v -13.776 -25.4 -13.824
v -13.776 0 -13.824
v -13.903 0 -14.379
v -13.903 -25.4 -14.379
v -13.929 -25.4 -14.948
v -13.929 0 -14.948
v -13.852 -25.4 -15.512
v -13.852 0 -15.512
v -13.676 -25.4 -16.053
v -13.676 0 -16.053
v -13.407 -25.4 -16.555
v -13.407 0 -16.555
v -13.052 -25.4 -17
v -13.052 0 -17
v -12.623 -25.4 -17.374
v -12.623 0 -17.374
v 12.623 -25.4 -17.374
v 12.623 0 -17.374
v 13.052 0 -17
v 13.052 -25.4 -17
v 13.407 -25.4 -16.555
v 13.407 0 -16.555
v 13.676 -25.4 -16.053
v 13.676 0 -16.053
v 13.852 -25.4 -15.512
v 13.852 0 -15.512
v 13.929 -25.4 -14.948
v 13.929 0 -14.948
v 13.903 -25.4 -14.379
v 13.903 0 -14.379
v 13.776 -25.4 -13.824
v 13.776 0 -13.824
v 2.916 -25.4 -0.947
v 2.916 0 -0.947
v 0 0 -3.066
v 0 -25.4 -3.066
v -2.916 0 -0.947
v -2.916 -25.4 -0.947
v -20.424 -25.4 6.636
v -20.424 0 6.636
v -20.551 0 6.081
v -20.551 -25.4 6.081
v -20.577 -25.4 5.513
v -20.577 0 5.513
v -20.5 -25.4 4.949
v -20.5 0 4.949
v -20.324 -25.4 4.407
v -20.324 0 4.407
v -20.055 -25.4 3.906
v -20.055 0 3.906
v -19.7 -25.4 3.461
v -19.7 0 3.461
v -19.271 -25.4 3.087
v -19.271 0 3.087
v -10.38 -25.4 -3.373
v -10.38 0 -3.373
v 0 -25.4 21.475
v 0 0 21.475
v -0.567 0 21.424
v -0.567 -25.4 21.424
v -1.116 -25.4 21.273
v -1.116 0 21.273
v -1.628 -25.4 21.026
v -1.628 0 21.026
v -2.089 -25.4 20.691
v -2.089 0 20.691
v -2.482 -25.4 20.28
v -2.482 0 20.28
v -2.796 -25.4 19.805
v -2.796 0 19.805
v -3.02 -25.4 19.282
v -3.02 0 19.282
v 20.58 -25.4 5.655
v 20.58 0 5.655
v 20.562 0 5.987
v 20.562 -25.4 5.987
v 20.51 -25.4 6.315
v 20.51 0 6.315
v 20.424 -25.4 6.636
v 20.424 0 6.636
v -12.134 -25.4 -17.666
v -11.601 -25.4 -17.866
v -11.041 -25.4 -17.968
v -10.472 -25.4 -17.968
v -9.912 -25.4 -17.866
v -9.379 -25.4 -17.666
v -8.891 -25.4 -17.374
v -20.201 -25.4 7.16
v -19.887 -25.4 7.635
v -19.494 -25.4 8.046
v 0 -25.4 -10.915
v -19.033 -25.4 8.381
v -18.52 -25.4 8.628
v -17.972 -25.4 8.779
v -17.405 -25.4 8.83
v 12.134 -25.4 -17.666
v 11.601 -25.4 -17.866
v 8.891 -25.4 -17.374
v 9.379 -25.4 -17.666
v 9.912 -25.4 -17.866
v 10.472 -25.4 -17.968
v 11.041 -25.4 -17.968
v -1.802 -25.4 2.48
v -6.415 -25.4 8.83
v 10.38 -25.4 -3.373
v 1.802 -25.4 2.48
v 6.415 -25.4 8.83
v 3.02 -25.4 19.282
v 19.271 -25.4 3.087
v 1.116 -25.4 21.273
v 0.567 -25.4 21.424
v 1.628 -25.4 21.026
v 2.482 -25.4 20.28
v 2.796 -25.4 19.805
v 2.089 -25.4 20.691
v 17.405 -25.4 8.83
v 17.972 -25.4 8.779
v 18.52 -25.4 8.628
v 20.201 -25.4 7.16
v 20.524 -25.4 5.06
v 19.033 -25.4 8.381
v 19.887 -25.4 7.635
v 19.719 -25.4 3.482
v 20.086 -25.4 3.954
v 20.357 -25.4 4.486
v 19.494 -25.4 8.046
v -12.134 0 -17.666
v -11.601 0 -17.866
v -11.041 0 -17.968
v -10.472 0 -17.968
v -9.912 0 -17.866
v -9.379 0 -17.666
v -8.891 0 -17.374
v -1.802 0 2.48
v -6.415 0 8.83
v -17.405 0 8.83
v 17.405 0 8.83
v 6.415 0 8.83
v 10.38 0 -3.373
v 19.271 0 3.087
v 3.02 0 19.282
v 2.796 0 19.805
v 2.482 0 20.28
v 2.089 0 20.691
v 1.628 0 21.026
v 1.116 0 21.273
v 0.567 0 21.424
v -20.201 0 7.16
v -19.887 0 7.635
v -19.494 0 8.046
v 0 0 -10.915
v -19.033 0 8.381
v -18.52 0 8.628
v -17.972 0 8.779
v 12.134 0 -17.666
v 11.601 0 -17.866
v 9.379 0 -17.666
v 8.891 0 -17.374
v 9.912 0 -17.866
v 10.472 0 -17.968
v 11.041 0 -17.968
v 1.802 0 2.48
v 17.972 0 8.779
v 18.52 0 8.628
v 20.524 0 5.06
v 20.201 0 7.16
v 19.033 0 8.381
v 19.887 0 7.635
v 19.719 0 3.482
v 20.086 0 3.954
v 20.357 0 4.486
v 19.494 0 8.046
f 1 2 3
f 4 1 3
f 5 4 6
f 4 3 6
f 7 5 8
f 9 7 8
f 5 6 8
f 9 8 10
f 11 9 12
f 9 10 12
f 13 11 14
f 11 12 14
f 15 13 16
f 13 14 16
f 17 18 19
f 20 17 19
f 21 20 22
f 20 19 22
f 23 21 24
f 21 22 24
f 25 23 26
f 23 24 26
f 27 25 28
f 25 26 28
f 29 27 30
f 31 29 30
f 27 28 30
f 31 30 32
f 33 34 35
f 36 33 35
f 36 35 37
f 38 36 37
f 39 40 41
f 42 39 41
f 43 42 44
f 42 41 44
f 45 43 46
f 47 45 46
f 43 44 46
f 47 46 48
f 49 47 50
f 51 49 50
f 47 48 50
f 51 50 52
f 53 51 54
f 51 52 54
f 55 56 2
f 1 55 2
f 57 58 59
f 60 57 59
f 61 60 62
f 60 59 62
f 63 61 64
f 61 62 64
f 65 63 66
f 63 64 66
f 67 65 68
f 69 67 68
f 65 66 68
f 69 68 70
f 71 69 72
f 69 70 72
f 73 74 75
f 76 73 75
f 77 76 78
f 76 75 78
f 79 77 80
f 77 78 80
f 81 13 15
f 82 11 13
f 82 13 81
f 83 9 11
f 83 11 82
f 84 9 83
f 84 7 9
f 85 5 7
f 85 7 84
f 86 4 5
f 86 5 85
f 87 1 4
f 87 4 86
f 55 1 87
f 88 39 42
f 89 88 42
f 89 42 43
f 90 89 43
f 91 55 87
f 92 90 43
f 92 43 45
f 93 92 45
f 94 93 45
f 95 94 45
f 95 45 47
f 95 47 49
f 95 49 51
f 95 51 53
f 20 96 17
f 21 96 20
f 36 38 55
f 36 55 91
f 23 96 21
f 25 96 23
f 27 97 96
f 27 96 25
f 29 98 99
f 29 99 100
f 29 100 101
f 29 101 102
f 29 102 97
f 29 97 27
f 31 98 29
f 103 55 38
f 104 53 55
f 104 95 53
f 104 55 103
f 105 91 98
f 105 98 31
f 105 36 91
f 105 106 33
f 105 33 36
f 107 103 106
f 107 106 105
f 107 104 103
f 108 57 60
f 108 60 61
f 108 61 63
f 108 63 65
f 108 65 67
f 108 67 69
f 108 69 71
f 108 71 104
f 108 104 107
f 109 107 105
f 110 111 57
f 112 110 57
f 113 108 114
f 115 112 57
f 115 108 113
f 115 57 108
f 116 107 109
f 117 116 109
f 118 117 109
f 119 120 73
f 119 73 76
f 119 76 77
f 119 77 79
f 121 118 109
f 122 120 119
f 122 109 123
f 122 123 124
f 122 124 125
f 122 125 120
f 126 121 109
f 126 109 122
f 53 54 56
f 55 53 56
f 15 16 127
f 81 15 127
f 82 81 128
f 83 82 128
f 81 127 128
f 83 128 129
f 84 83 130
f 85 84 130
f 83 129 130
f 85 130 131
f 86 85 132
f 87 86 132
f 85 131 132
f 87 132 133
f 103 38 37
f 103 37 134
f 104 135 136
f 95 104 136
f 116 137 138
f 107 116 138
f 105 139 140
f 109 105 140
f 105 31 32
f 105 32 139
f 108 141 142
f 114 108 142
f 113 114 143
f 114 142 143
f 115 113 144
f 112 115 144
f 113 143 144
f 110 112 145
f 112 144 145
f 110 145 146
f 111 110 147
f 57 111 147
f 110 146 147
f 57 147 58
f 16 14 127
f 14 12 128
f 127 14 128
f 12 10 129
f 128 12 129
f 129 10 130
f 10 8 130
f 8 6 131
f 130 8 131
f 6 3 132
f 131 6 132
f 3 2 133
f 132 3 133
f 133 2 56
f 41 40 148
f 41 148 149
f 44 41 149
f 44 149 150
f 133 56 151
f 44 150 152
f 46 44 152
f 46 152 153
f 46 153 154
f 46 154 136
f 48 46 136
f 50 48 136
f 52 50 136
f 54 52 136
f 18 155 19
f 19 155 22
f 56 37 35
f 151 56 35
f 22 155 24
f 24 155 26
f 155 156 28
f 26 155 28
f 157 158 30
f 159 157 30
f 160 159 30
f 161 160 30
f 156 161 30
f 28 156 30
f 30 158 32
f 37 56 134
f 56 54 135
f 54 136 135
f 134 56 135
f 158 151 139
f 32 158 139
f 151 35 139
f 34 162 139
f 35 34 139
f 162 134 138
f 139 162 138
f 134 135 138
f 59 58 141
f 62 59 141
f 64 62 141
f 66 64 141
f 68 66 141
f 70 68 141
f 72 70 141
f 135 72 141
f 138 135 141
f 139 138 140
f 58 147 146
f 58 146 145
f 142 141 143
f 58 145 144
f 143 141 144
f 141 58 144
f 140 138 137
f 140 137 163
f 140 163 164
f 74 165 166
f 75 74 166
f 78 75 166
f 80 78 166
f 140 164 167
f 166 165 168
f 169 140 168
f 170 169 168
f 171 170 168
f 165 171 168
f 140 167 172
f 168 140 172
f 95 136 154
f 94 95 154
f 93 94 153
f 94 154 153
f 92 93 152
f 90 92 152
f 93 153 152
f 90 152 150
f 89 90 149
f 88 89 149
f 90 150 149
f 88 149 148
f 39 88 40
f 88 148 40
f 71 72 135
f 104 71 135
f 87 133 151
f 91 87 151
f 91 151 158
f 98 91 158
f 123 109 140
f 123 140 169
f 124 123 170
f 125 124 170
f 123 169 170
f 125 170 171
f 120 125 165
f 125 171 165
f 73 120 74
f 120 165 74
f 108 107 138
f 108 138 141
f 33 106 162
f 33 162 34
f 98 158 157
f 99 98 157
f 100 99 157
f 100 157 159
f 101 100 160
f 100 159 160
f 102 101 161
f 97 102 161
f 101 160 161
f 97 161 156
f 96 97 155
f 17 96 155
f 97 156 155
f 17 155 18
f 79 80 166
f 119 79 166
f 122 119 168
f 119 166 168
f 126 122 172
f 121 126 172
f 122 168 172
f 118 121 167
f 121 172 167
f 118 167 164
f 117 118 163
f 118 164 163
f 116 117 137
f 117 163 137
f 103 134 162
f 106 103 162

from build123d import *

# Parameters (mm, degrees)
F1_DEPTH = 25.4
F2_DEPTH = 25.4
F3_DEPTH = 25.4
F4_DEPTH = 25.4
F5_DEPTH = 25.4


with BuildPart() as f1:
    # F0 (on Front) → F1 (new body)
    with BuildSketch(Plane.XZ):
        with BuildLine():
            ThreePointArc((3.0196044392, 17.3193664988), (3.1359104814, 17.8038160294), (3.175, 18.3004954559))
            ThreePointArc((3.175, 18.3004954559), (3.1359104814, 18.7971748824), (3.0196044392, 19.2816244131))
            ThreePointArc((3.0196044392, 19.2816244131), (1.8662181994, 20.8691243961), (5.78e-08, 21.4754954559))
            ThreePointArc((5.78e-08, 21.4754954559), (-1.866217236, 20.869125096), (-3.019603739, 19.2816265682))
            ThreePointArc((-3.019603739, 19.2816265682), (-3.175, 18.3004954559), (-3.019603739, 17.3193643436))
            ThreePointArc((-3.019603739, 17.3193643436), (1.133e-06, 15.1254954559), (3.0196044392, 17.3193664988))
        make_face()
        with BuildLine():
            Line((0.261295375, 8.8301641014), (3.0196044392, 17.3193664988))
            ThreePointArc((3.0196044392, 17.3193664988), (1.133e-06, 15.1254954559), (-3.019603739, 17.3193643436))
            Line((-3.019603739, 17.3193643436), (-0.261295375, 8.8301641014))
            Line((-0.261295375, 8.8301641014), (0.261295375, 8.8301641014))
        make_face()
        with BuildLine():
            Line((-0.261295375, 8.8301641014), (-3.019603739, 17.3193643436))
            ThreePointArc((-3.019603739, 17.3193643436), (-3.175, 18.3004954559), (-3.019603739, 19.2816265682))
            Line((-3.019603739, 19.2816265682), (-6.4154897489, 8.8301641014))
            Line((-6.4154897489, 8.8301641014), (-0.261295375, 8.8301641014))
        make_face()
        Polygon((0, 8.0259796274), (-0.261295375, 8.8301641014), (-6.4154897489, 8.8301641014), (-8.3172403971, 2.9771774395), (-7.6331602243, 2.4801641014), (-1.8019446961, 2.4801641014), align=None)
        Polygon((-2.9156077641, -0.947338389), (-1.8019446961, 2.4801641014), (-7.6331602243, 2.4801641014), align=None)
        Polygon((-4.7175524602, -6.493153915), (-2.9156077641, -0.947338389), (-7.6331602243, 2.4801641014), (-8.47872982, 2.4801641014), (-10.3804804682, -3.3728225605), (-5.401632633, -6.9901672532), align=None)
        with BuildLine():
            Line((-5.401632633, -6.9901672532), (-10.3804804682, -3.3728225605))
            Line((-10.3804804682, -3.3728225605), (-13.7763657779, -13.8242828722))
            ThreePointArc((-13.7763657779, -13.8242828722), (-13.3253902958, -12.9391936533), (-12.6229795147, -12.2367828722))
            Line((-12.6229795147, -12.2367828722), (-5.401632633, -6.9901672532))
        make_face()
        with BuildLine():
            Line((-4.9788478352, -7.297338389), (-5.401632633, -6.9901672532))
            Line((-5.401632633, -6.9901672532), (-12.6229795147, -12.2367828722))
            ThreePointArc((-12.6229795147, -12.2367828722), (-9.315341502, -11.976466115), (-7.5817613386, -14.8054118293))
            ThreePointArc((-7.5817613386, -14.8054118293), (-7.6208508572, -15.3020912558), (-7.7371568994, -15.7865407865))
            Line((-7.7371568994, -15.7865407865), (-4.9788478352, -7.297338389))
        make_face()
        with BuildLine():
            ThreePointArc((-13.7763657779, -13.8242828722), (-13.7763657849, -15.7865407647), (-12.6229795517, -17.3740407596))
            ThreePointArc((-12.6229795517, -17.3740407596), (-10.7567613615, -17.9804118293), (-8.8905431626, -17.3740407865))
            ThreePointArc((-8.8905431626, -17.3740407865), (-8.1881323815, -16.6716300054), (-7.7371568994, -15.7865407865))
            ThreePointArc((-7.7371568994, -15.7865407865), (-7.6208508572, -15.3020912558), (-7.5817613386, -14.8054118293))
            ThreePointArc((-7.5817613386, -14.8054118293), (-9.315341502, -11.976466115), (-12.6229795147, -12.2367828722))
            ThreePointArc((-12.6229795147, -12.2367828722), (-13.3253902958, -12.9391936533), (-13.7763657779, -13.8242828722))
        make_face()
        Polygon((0, 8.0259796274), (0.261295375, 8.8301641014), (-0.261295375, 8.8301641014), align=None)
        Polygon((-4.9788478352, -7.297338389), (-4.7175524602, -6.493153915), (-5.401632633, -6.9901672532), align=None)
        Polygon((-7.6331602243, 2.4801641014), (-8.3172403971, 2.9771774395), (-8.47872982, 2.4801641014), align=None)
    extrude(amount=F1_DEPTH)

    # F0 (on Front) → F2 (join)
    with BuildSketch(Plane.XZ):
        with BuildLine():
            ThreePointArc((-17.4048054548, 8.8301641014), (-19.2710239415, 8.2237928328), (-20.4244101314, 6.636292328))
            ThreePointArc((-20.4244101314, 6.636292328), (-20.4244097753, 4.674034779), (-19.2710236308, 3.0865351442))
            ThreePointArc((-19.2710236308, 3.0865351442), (-18.3859344119, 2.6355596621), (-17.4048054548, 2.4801641014))
            ThreePointArc((-17.4048054548, 2.4801641014), (-15.1597414245, 3.4101000711), (-14.2298054548, 5.6551641014))
            ThreePointArc((-14.2298054548, 5.6551641014), (-14.5758597405, 7.096583938), (-15.5385872788, 8.2237930585))
            ThreePointArc((-15.5385872788, 8.2237930585), (-16.4236764976, 8.6747685406), (-17.4048054548, 8.8301641014))
        make_face()
        with BuildLine():
            Line((-8.3172403971, 2.9771774395), (-6.4154897489, 8.8301641014))
            Line((-6.4154897489, 8.8301641014), (-17.4048054548, 8.8301641014))
            ThreePointArc((-17.4048054548, 8.8301641014), (-16.4236764976, 8.6747685406), (-15.5385872788, 8.2237930585))
            Line((-15.5385872788, 8.2237930585), (-8.3172403971, 2.9771774395))
        make_face()
        with BuildLine():
            Line((-8.47872982, 2.4801641014), (-8.3172403971, 2.9771774395))
            Line((-8.3172403971, 2.9771774395), (-15.5385872788, 8.2237930585))
            ThreePointArc((-15.5385872788, 8.2237930585), (-14.5758597405, 7.096583938), (-14.2298054548, 5.6551641014))
            ThreePointArc((-14.2298054548, 5.6551641014), (-15.1597414245, 3.4101000711), (-17.4048054548, 2.4801641014))
            Line((-17.4048054548, 2.4801641014), (-8.47872982, 2.4801641014))
        make_face()
        Polygon((1.8019446961, 2.4801641014), (0, 8.0259796274), (-1.8019446961, 2.4801641014), align=None)
        Polygon((8.3172403971, 2.9771774395), (6.4154897489, 8.8301641014), (0.261295375, 8.8301641014), (0, 8.0259796274), (1.8019446961, 2.4801641014), (7.6331602243, 2.4801641014), align=None)
        with BuildLine():
            Line((17.4048054548, 8.8301641014), (6.4154897489, 8.8301641014))
            Line((6.4154897489, 8.8301641014), (8.3172403971, 2.9771774395))
            Line((8.3172403971, 2.9771774395), (15.5385872788, 8.2237930585))
            ThreePointArc((15.5385872788, 8.2237930585), (16.4236764976, 8.6747685406), (17.4048054548, 8.8301641014))
        make_face()
        with BuildLine():
            Line((15.5385872788, 8.2237930585), (8.3172403971, 2.9771774395))
            Line((8.3172403971, 2.9771774395), (8.47872982, 2.4801641014))
            Line((8.47872982, 2.4801641014), (17.4048054548, 2.4801641014))
            ThreePointArc((17.4048054548, 2.4801641014), (14.3852010155, 4.6740351442), (15.5385872788, 8.2237930585))
        make_face()
        with BuildLine():
            ThreePointArc((20.4244101232, 6.6362923532), (19.2710239308, 8.2237928405), (17.4048054548, 8.8301641014))
            ThreePointArc((17.4048054548, 8.8301641014), (16.4236764976, 8.6747685406), (15.5385872788, 8.2237930585))
            ThreePointArc((15.5385872788, 8.2237930585), (14.3852010155, 4.6740351442), (17.4048054548, 2.4801641014))
            ThreePointArc((17.4048054548, 2.4801641014), (18.3859344119, 2.6355596621), (19.2710236308, 3.0865351442))
            ThreePointArc((19.2710236308, 3.0865351442), (20.2337511691, 4.2137442647), (20.5798054548, 5.6551641014))
            ThreePointArc((20.5798054548, 5.6551641014), (20.5407159942, 6.1518431616), (20.4244101232, 6.6362923532))
        make_face()
        Polygon((8.47872982, 2.4801641014), (8.3172403971, 2.9771774395), (7.6331602243, 2.4801641014), align=None)
    extrude(amount=F2_DEPTH)

    # F0 (on Front) → F3 (join)
    with BuildSketch(Plane.XZ):
        with BuildLine():
            ThreePointArc((3.0196044392, 19.2816244131), (3.1359104814, 18.7971748824), (3.175, 18.3004954559))
            ThreePointArc((3.175, 18.3004954559), (3.1359104814, 17.8038160294), (3.0196044392, 17.3193664988))
            Line((3.0196044392, 17.3193664988), (0.261295375, 8.8301641014))
            Line((0.261295375, 8.8301641014), (6.4154897489, 8.8301641014))
            Line((6.4154897489, 8.8301641014), (3.0196044392, 19.2816244131))
        make_face()
        Polygon((2.9156077641, -0.947338389), (7.6331602243, 2.4801641014), (1.8019446961, 2.4801641014), align=None)
        Polygon((10.3804804682, -3.3728225605), (8.47872982, 2.4801641014), (7.6331602243, 2.4801641014), (2.9156077641, -0.947338389), (4.7175524602, -6.493153915), (5.401632633, -6.9901672532), align=None)
        with BuildLine():
            Line((13.7763657779, -13.8242828722), (10.3804804682, -3.3728225605))
            Line((10.3804804682, -3.3728225605), (5.401632633, -6.9901672532))
            Line((5.401632633, -6.9901672532), (12.6229795147, -12.2367828722))
            ThreePointArc((12.6229795147, -12.2367828722), (13.3253902958, -12.9391936533), (13.7763657779, -13.8242828722))
        make_face()
        with BuildLine():
            Line((12.6229795147, -12.2367828722), (5.401632633, -6.9901672532))
            Line((5.401632633, -6.9901672532), (4.9788478352, -7.297338389))
            Line((4.9788478352, -7.297338389), (7.7371568994, -15.7865407865))
            ThreePointArc((7.7371568994, -15.7865407865), (8.8905431626, -12.2367828722), (12.6229795147, -12.2367828722))
        make_face()
        with BuildLine():
            ThreePointArc((8.8905431626, -17.3740407865), (10.7567613452, -17.9804118293), (12.6229795253, -17.3740407787))
            ThreePointArc((12.6229795253, -17.3740407787), (13.5857070559, -16.2468316601), (13.9317613386, -14.8054118293))
            ThreePointArc((13.9317613386, -14.8054118293), (13.89267182, -14.3087324028), (13.7763657779, -13.8242828722))
            ThreePointArc((13.7763657779, -13.8242828722), (13.3253902958, -12.9391936533), (12.6229795147, -12.2367828722))
            ThreePointArc((12.6229795147, -12.2367828722), (8.8905431626, -12.2367828722), (7.7371568994, -15.7865407865))
            ThreePointArc((7.7371568994, -15.7865407865), (8.1881323815, -16.6716300054), (8.8905431626, -17.3740407865))
        make_face()
        Polygon((4.9788478352, -7.297338389), (5.401632633, -6.9901672532), (4.7175524602, -6.493153915), align=None)
    extrude(amount=F3_DEPTH)

    # F0 (on Front) → F4 (join)
    with BuildSketch(Plane.XZ):
        with BuildLine():
            ThreePointArc((-7.7371568994, -15.7865407865), (-8.1881323815, -16.6716300054), (-8.8905431626, -17.3740407865))
            Line((-8.8905431626, -17.3740407865), (0, -10.9146830818))
            Line((0, -10.9146830818), (-4.9788478352, -7.297338389))
            Line((-4.9788478352, -7.297338389), (-7.7371568994, -15.7865407865))
        make_face()
        Polygon((4.9788478352, -7.297338389), (4.7175524602, -6.493153915), (0, -3.0656514246), (-4.7175524602, -6.493153915), (-4.9788478352, -7.297338389), (0, -10.9146830818), align=None)
        Polygon((4.7175524602, -6.493153915), (2.9156077641, -0.947338389), (0, -3.0656514246), align=None)
        with BuildLine():
            Line((17.4048054548, 2.4801641014), (8.47872982, 2.4801641014))
            Line((8.47872982, 2.4801641014), (10.3804804682, -3.3728225605))
            Line((10.3804804682, -3.3728225605), (19.2710236308, 3.0865351442))
            ThreePointArc((19.2710236308, 3.0865351442), (18.3859344119, 2.6355596621), (17.4048054548, 2.4801641014))
        make_face()
    extrude(amount=F4_DEPTH)

    # F0 (on Front) → F5 (join)
    with BuildSketch(Plane.XZ):
        with BuildLine():
            ThreePointArc((-17.4048054548, 2.4801641014), (-18.3859344119, 2.6355596621), (-19.2710236308, 3.0865351442))
            Line((-19.2710236308, 3.0865351442), (-10.3804804682, -3.3728225605))
            Line((-10.3804804682, -3.3728225605), (-8.47872982, 2.4801641014))
            Line((-8.47872982, 2.4801641014), (-17.4048054548, 2.4801641014))
        make_face()
        Polygon((0, -3.0656514246), (-2.9156077641, -0.947338389), (-4.7175524602, -6.493153915), align=None)
        with BuildLine():
            Line((0, -10.9146830818), (8.8905431626, -17.3740407865))
            ThreePointArc((8.8905431626, -17.3740407865), (8.1881323815, -16.6716300054), (7.7371568994, -15.7865407865))
            Line((7.7371568994, -15.7865407865), (4.9788478352, -7.297338389))
            Line((4.9788478352, -7.297338389), (0, -10.9146830818))
        make_face()
    extrude(amount=F5_DEPTH)


solid = f1.part
